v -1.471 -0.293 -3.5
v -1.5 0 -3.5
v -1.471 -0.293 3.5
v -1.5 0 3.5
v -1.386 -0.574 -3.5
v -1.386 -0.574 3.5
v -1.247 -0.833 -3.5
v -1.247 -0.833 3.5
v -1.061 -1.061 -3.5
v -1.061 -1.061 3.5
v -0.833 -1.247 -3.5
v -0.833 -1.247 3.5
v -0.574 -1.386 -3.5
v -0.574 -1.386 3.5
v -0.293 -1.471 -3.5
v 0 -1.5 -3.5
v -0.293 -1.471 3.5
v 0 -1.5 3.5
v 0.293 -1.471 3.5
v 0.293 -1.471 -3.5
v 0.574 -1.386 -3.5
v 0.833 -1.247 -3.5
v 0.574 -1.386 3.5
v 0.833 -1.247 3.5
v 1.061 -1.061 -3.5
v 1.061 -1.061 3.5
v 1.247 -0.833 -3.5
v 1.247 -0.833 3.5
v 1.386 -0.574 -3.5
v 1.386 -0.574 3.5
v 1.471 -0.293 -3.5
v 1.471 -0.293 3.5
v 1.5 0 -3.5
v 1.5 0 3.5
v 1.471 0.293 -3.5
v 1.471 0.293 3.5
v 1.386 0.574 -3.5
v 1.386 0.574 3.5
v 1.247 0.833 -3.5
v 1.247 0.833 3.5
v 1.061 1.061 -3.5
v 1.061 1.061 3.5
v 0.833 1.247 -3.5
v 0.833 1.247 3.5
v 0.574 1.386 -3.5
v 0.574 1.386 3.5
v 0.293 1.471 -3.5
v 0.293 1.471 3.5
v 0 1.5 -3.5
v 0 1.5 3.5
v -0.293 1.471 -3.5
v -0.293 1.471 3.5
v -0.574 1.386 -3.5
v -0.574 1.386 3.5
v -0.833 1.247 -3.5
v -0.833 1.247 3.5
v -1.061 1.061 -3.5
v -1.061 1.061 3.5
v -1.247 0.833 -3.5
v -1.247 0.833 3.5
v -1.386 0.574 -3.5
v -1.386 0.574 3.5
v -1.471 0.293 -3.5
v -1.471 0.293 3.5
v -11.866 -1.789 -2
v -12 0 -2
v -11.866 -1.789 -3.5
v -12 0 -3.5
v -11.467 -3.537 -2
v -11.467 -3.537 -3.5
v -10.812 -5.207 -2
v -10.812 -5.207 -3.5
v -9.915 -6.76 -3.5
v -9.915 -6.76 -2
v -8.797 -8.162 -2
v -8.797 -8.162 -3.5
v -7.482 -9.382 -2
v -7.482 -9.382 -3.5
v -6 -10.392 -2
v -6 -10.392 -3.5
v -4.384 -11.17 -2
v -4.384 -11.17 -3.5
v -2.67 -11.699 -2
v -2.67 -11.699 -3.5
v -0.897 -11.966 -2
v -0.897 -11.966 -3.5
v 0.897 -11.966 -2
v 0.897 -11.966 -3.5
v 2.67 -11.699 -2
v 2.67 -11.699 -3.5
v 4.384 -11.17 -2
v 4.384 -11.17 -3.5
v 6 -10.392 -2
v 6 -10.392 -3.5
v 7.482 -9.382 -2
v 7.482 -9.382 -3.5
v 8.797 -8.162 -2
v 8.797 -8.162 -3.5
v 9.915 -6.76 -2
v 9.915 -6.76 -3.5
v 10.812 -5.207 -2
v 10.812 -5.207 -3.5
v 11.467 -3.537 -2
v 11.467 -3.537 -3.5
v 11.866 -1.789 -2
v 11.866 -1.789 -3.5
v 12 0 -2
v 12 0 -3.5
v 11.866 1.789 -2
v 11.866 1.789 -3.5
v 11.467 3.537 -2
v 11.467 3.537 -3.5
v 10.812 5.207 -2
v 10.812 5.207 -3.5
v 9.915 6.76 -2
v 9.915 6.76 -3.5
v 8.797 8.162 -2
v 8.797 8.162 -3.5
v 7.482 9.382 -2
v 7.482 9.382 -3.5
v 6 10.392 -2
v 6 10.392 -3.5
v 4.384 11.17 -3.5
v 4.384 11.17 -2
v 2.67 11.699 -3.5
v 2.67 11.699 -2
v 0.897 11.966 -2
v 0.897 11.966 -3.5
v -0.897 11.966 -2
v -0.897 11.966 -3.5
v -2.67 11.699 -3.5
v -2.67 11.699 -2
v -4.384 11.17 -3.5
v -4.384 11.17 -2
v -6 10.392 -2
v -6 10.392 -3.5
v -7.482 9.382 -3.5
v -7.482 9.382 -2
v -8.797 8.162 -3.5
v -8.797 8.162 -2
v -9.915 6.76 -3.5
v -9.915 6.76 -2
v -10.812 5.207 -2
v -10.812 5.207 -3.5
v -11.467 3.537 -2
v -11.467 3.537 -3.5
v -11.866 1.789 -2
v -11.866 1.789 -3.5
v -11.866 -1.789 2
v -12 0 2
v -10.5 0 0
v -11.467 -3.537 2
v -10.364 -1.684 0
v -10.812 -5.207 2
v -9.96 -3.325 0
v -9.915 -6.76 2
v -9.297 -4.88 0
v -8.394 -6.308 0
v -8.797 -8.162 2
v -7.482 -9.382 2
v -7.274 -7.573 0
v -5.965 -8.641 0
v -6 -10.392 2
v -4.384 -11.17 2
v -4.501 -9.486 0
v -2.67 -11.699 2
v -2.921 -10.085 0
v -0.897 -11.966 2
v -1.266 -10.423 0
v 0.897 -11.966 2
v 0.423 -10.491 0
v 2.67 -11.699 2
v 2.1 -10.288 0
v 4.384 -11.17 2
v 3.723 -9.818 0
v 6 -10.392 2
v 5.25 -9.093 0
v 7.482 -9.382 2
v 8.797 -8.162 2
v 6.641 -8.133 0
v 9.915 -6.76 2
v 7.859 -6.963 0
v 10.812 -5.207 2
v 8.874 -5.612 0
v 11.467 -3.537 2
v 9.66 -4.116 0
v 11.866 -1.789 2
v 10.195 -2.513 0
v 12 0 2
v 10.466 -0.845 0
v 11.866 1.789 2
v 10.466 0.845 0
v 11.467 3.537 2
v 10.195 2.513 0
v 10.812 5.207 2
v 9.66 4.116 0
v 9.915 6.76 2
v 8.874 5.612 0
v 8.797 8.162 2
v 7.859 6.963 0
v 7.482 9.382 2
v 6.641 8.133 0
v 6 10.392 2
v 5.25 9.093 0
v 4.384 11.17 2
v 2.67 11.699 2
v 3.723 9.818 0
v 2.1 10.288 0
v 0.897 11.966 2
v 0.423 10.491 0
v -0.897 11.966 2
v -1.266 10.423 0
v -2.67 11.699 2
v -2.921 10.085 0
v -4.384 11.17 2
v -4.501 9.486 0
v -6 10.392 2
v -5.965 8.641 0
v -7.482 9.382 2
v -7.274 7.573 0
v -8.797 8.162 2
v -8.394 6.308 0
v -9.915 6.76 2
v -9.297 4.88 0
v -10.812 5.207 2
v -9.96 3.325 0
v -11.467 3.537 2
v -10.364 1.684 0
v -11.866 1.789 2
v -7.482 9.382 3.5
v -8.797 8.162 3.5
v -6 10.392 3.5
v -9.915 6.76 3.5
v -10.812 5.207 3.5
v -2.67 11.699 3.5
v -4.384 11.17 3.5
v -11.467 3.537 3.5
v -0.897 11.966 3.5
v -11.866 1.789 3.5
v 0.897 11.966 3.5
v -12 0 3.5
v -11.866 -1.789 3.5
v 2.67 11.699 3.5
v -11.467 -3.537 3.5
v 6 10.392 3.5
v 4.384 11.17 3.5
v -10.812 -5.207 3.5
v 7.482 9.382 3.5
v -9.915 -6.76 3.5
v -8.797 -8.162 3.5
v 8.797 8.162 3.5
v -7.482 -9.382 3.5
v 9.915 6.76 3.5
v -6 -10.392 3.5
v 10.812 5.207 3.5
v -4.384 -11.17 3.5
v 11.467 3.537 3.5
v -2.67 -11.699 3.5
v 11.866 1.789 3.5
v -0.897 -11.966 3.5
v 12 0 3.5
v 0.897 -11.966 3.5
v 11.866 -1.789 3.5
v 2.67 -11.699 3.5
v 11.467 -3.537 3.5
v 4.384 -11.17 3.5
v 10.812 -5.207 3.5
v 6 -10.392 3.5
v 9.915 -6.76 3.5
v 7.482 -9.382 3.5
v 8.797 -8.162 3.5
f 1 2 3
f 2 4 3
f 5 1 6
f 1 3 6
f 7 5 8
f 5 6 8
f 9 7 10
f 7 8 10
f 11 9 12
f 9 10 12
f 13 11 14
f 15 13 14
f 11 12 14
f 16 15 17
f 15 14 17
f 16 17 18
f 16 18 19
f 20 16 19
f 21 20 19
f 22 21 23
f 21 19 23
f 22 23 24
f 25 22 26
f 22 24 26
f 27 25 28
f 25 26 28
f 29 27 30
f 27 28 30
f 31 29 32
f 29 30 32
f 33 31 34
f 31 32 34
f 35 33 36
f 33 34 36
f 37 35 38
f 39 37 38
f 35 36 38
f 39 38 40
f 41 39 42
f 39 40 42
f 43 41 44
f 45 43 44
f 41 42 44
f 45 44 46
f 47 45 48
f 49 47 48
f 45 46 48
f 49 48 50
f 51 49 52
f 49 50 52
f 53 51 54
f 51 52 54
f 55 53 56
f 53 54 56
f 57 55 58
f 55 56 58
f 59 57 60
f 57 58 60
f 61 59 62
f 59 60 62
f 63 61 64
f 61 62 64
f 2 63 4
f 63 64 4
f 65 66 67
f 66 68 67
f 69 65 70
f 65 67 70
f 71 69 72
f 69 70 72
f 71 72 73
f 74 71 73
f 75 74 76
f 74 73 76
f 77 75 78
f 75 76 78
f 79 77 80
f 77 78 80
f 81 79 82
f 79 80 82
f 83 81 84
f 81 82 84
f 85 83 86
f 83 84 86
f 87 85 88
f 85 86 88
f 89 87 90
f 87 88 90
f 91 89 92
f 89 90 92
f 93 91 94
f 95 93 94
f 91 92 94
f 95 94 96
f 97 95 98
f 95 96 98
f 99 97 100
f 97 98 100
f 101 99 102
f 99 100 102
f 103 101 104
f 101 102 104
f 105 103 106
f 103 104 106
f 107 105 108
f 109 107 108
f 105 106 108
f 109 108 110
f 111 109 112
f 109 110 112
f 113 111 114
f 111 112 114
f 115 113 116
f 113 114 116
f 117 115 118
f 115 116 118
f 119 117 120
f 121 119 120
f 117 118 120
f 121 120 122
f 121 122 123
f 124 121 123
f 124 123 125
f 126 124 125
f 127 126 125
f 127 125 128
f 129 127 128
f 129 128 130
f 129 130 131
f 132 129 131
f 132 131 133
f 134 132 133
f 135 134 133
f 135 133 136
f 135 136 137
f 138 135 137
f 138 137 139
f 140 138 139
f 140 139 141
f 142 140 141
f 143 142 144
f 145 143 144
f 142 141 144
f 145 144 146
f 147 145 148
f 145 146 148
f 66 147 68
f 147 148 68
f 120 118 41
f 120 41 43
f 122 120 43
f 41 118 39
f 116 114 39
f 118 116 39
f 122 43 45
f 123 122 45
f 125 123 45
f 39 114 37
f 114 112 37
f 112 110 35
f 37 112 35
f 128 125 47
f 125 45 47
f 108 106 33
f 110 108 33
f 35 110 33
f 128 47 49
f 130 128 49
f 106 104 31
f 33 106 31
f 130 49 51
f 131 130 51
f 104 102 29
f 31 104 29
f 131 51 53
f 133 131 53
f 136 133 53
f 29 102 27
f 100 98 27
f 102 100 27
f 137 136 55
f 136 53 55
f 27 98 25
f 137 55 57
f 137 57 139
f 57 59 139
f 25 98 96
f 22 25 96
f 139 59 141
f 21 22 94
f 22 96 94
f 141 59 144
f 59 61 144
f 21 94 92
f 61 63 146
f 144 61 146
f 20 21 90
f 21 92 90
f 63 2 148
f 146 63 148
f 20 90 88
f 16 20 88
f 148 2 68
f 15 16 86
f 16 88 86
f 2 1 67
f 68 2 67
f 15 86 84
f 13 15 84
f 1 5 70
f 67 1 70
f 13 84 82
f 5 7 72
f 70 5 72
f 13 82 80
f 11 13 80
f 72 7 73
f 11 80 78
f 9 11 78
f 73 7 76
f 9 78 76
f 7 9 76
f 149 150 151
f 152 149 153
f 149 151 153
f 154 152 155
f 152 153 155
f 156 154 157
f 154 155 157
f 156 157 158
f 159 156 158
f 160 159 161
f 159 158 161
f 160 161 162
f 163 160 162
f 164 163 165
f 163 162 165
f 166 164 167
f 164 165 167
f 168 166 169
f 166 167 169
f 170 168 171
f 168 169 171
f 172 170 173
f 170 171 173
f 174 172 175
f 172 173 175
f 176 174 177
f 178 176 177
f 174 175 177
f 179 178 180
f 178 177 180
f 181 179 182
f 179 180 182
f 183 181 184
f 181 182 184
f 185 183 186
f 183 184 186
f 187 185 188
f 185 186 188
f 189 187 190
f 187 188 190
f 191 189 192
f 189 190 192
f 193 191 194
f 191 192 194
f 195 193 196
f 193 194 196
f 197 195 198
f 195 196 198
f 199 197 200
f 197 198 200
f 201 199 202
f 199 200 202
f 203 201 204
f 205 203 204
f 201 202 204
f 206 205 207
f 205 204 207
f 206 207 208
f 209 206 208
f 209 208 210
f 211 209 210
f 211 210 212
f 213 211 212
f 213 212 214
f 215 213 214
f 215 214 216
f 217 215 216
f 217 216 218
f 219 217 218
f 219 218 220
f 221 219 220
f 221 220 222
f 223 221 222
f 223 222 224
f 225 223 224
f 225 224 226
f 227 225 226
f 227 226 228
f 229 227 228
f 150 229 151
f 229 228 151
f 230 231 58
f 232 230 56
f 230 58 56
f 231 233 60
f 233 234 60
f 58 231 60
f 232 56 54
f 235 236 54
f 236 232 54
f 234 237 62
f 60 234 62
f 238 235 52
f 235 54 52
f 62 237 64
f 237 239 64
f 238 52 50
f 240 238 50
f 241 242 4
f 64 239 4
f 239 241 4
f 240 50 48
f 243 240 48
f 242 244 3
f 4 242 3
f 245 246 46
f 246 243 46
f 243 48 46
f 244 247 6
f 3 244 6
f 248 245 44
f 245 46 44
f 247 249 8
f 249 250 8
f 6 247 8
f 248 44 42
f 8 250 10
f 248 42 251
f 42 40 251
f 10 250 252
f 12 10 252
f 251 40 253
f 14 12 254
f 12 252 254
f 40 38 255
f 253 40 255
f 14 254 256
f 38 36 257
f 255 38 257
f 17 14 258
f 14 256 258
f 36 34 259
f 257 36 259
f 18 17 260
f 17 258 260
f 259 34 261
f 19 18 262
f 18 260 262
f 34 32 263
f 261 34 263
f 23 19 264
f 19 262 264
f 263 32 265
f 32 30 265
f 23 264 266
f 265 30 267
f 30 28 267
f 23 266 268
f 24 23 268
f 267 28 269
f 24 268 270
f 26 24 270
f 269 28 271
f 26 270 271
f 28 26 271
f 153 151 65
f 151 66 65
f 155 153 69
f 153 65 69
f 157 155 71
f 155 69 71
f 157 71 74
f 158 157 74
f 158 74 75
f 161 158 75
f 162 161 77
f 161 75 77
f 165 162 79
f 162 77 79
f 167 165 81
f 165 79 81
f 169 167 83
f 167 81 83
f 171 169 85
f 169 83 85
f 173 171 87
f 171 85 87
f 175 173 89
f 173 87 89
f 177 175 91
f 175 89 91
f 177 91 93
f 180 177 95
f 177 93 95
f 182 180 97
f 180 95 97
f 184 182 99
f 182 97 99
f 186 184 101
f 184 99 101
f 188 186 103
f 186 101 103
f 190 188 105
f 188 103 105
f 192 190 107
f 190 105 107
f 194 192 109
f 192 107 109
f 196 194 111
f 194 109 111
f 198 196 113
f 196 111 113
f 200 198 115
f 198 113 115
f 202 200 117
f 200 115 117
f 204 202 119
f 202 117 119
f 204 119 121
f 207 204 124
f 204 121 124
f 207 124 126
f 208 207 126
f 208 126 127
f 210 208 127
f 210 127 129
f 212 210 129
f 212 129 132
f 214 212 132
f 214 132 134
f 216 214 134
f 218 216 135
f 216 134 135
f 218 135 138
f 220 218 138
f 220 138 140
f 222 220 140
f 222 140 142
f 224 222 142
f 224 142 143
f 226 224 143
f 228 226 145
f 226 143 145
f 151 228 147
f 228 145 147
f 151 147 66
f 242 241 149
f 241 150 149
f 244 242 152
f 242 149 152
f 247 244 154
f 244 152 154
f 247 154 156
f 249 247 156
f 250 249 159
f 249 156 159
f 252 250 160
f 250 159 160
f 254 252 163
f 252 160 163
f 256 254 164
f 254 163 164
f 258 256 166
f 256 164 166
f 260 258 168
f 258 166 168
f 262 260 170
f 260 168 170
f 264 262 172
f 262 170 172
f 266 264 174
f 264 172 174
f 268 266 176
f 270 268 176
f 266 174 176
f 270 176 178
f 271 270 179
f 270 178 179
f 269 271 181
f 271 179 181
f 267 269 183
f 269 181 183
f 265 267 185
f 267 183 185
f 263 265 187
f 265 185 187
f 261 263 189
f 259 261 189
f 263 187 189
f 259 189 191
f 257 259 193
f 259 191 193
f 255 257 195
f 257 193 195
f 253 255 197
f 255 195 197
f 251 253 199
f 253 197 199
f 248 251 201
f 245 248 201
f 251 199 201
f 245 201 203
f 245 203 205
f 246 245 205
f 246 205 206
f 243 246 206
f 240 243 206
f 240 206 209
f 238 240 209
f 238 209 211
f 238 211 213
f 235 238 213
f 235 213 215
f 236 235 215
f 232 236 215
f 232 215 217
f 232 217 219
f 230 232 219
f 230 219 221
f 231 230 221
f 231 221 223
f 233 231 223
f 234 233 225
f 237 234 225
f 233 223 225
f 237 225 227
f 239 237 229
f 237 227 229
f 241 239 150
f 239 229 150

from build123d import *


with BuildPart() as f1:
    # F0 (on Front) → F1 (revolve)
    with BuildSketch(Plane.XZ):
        Polygon((-10.5, 0), (-1.5, 0), (-1.5, 3.5), (-12, 3.5), (-12, 2), align=None)
        Polygon((-1.5, -3.5), (-1.5, 0), (-10.5, 0), (-12, -2), (-12, -3.5), align=None)
    revolve(axis=Axis((0, 0, 1), (0, 0, 1)))


solid = f1.part
